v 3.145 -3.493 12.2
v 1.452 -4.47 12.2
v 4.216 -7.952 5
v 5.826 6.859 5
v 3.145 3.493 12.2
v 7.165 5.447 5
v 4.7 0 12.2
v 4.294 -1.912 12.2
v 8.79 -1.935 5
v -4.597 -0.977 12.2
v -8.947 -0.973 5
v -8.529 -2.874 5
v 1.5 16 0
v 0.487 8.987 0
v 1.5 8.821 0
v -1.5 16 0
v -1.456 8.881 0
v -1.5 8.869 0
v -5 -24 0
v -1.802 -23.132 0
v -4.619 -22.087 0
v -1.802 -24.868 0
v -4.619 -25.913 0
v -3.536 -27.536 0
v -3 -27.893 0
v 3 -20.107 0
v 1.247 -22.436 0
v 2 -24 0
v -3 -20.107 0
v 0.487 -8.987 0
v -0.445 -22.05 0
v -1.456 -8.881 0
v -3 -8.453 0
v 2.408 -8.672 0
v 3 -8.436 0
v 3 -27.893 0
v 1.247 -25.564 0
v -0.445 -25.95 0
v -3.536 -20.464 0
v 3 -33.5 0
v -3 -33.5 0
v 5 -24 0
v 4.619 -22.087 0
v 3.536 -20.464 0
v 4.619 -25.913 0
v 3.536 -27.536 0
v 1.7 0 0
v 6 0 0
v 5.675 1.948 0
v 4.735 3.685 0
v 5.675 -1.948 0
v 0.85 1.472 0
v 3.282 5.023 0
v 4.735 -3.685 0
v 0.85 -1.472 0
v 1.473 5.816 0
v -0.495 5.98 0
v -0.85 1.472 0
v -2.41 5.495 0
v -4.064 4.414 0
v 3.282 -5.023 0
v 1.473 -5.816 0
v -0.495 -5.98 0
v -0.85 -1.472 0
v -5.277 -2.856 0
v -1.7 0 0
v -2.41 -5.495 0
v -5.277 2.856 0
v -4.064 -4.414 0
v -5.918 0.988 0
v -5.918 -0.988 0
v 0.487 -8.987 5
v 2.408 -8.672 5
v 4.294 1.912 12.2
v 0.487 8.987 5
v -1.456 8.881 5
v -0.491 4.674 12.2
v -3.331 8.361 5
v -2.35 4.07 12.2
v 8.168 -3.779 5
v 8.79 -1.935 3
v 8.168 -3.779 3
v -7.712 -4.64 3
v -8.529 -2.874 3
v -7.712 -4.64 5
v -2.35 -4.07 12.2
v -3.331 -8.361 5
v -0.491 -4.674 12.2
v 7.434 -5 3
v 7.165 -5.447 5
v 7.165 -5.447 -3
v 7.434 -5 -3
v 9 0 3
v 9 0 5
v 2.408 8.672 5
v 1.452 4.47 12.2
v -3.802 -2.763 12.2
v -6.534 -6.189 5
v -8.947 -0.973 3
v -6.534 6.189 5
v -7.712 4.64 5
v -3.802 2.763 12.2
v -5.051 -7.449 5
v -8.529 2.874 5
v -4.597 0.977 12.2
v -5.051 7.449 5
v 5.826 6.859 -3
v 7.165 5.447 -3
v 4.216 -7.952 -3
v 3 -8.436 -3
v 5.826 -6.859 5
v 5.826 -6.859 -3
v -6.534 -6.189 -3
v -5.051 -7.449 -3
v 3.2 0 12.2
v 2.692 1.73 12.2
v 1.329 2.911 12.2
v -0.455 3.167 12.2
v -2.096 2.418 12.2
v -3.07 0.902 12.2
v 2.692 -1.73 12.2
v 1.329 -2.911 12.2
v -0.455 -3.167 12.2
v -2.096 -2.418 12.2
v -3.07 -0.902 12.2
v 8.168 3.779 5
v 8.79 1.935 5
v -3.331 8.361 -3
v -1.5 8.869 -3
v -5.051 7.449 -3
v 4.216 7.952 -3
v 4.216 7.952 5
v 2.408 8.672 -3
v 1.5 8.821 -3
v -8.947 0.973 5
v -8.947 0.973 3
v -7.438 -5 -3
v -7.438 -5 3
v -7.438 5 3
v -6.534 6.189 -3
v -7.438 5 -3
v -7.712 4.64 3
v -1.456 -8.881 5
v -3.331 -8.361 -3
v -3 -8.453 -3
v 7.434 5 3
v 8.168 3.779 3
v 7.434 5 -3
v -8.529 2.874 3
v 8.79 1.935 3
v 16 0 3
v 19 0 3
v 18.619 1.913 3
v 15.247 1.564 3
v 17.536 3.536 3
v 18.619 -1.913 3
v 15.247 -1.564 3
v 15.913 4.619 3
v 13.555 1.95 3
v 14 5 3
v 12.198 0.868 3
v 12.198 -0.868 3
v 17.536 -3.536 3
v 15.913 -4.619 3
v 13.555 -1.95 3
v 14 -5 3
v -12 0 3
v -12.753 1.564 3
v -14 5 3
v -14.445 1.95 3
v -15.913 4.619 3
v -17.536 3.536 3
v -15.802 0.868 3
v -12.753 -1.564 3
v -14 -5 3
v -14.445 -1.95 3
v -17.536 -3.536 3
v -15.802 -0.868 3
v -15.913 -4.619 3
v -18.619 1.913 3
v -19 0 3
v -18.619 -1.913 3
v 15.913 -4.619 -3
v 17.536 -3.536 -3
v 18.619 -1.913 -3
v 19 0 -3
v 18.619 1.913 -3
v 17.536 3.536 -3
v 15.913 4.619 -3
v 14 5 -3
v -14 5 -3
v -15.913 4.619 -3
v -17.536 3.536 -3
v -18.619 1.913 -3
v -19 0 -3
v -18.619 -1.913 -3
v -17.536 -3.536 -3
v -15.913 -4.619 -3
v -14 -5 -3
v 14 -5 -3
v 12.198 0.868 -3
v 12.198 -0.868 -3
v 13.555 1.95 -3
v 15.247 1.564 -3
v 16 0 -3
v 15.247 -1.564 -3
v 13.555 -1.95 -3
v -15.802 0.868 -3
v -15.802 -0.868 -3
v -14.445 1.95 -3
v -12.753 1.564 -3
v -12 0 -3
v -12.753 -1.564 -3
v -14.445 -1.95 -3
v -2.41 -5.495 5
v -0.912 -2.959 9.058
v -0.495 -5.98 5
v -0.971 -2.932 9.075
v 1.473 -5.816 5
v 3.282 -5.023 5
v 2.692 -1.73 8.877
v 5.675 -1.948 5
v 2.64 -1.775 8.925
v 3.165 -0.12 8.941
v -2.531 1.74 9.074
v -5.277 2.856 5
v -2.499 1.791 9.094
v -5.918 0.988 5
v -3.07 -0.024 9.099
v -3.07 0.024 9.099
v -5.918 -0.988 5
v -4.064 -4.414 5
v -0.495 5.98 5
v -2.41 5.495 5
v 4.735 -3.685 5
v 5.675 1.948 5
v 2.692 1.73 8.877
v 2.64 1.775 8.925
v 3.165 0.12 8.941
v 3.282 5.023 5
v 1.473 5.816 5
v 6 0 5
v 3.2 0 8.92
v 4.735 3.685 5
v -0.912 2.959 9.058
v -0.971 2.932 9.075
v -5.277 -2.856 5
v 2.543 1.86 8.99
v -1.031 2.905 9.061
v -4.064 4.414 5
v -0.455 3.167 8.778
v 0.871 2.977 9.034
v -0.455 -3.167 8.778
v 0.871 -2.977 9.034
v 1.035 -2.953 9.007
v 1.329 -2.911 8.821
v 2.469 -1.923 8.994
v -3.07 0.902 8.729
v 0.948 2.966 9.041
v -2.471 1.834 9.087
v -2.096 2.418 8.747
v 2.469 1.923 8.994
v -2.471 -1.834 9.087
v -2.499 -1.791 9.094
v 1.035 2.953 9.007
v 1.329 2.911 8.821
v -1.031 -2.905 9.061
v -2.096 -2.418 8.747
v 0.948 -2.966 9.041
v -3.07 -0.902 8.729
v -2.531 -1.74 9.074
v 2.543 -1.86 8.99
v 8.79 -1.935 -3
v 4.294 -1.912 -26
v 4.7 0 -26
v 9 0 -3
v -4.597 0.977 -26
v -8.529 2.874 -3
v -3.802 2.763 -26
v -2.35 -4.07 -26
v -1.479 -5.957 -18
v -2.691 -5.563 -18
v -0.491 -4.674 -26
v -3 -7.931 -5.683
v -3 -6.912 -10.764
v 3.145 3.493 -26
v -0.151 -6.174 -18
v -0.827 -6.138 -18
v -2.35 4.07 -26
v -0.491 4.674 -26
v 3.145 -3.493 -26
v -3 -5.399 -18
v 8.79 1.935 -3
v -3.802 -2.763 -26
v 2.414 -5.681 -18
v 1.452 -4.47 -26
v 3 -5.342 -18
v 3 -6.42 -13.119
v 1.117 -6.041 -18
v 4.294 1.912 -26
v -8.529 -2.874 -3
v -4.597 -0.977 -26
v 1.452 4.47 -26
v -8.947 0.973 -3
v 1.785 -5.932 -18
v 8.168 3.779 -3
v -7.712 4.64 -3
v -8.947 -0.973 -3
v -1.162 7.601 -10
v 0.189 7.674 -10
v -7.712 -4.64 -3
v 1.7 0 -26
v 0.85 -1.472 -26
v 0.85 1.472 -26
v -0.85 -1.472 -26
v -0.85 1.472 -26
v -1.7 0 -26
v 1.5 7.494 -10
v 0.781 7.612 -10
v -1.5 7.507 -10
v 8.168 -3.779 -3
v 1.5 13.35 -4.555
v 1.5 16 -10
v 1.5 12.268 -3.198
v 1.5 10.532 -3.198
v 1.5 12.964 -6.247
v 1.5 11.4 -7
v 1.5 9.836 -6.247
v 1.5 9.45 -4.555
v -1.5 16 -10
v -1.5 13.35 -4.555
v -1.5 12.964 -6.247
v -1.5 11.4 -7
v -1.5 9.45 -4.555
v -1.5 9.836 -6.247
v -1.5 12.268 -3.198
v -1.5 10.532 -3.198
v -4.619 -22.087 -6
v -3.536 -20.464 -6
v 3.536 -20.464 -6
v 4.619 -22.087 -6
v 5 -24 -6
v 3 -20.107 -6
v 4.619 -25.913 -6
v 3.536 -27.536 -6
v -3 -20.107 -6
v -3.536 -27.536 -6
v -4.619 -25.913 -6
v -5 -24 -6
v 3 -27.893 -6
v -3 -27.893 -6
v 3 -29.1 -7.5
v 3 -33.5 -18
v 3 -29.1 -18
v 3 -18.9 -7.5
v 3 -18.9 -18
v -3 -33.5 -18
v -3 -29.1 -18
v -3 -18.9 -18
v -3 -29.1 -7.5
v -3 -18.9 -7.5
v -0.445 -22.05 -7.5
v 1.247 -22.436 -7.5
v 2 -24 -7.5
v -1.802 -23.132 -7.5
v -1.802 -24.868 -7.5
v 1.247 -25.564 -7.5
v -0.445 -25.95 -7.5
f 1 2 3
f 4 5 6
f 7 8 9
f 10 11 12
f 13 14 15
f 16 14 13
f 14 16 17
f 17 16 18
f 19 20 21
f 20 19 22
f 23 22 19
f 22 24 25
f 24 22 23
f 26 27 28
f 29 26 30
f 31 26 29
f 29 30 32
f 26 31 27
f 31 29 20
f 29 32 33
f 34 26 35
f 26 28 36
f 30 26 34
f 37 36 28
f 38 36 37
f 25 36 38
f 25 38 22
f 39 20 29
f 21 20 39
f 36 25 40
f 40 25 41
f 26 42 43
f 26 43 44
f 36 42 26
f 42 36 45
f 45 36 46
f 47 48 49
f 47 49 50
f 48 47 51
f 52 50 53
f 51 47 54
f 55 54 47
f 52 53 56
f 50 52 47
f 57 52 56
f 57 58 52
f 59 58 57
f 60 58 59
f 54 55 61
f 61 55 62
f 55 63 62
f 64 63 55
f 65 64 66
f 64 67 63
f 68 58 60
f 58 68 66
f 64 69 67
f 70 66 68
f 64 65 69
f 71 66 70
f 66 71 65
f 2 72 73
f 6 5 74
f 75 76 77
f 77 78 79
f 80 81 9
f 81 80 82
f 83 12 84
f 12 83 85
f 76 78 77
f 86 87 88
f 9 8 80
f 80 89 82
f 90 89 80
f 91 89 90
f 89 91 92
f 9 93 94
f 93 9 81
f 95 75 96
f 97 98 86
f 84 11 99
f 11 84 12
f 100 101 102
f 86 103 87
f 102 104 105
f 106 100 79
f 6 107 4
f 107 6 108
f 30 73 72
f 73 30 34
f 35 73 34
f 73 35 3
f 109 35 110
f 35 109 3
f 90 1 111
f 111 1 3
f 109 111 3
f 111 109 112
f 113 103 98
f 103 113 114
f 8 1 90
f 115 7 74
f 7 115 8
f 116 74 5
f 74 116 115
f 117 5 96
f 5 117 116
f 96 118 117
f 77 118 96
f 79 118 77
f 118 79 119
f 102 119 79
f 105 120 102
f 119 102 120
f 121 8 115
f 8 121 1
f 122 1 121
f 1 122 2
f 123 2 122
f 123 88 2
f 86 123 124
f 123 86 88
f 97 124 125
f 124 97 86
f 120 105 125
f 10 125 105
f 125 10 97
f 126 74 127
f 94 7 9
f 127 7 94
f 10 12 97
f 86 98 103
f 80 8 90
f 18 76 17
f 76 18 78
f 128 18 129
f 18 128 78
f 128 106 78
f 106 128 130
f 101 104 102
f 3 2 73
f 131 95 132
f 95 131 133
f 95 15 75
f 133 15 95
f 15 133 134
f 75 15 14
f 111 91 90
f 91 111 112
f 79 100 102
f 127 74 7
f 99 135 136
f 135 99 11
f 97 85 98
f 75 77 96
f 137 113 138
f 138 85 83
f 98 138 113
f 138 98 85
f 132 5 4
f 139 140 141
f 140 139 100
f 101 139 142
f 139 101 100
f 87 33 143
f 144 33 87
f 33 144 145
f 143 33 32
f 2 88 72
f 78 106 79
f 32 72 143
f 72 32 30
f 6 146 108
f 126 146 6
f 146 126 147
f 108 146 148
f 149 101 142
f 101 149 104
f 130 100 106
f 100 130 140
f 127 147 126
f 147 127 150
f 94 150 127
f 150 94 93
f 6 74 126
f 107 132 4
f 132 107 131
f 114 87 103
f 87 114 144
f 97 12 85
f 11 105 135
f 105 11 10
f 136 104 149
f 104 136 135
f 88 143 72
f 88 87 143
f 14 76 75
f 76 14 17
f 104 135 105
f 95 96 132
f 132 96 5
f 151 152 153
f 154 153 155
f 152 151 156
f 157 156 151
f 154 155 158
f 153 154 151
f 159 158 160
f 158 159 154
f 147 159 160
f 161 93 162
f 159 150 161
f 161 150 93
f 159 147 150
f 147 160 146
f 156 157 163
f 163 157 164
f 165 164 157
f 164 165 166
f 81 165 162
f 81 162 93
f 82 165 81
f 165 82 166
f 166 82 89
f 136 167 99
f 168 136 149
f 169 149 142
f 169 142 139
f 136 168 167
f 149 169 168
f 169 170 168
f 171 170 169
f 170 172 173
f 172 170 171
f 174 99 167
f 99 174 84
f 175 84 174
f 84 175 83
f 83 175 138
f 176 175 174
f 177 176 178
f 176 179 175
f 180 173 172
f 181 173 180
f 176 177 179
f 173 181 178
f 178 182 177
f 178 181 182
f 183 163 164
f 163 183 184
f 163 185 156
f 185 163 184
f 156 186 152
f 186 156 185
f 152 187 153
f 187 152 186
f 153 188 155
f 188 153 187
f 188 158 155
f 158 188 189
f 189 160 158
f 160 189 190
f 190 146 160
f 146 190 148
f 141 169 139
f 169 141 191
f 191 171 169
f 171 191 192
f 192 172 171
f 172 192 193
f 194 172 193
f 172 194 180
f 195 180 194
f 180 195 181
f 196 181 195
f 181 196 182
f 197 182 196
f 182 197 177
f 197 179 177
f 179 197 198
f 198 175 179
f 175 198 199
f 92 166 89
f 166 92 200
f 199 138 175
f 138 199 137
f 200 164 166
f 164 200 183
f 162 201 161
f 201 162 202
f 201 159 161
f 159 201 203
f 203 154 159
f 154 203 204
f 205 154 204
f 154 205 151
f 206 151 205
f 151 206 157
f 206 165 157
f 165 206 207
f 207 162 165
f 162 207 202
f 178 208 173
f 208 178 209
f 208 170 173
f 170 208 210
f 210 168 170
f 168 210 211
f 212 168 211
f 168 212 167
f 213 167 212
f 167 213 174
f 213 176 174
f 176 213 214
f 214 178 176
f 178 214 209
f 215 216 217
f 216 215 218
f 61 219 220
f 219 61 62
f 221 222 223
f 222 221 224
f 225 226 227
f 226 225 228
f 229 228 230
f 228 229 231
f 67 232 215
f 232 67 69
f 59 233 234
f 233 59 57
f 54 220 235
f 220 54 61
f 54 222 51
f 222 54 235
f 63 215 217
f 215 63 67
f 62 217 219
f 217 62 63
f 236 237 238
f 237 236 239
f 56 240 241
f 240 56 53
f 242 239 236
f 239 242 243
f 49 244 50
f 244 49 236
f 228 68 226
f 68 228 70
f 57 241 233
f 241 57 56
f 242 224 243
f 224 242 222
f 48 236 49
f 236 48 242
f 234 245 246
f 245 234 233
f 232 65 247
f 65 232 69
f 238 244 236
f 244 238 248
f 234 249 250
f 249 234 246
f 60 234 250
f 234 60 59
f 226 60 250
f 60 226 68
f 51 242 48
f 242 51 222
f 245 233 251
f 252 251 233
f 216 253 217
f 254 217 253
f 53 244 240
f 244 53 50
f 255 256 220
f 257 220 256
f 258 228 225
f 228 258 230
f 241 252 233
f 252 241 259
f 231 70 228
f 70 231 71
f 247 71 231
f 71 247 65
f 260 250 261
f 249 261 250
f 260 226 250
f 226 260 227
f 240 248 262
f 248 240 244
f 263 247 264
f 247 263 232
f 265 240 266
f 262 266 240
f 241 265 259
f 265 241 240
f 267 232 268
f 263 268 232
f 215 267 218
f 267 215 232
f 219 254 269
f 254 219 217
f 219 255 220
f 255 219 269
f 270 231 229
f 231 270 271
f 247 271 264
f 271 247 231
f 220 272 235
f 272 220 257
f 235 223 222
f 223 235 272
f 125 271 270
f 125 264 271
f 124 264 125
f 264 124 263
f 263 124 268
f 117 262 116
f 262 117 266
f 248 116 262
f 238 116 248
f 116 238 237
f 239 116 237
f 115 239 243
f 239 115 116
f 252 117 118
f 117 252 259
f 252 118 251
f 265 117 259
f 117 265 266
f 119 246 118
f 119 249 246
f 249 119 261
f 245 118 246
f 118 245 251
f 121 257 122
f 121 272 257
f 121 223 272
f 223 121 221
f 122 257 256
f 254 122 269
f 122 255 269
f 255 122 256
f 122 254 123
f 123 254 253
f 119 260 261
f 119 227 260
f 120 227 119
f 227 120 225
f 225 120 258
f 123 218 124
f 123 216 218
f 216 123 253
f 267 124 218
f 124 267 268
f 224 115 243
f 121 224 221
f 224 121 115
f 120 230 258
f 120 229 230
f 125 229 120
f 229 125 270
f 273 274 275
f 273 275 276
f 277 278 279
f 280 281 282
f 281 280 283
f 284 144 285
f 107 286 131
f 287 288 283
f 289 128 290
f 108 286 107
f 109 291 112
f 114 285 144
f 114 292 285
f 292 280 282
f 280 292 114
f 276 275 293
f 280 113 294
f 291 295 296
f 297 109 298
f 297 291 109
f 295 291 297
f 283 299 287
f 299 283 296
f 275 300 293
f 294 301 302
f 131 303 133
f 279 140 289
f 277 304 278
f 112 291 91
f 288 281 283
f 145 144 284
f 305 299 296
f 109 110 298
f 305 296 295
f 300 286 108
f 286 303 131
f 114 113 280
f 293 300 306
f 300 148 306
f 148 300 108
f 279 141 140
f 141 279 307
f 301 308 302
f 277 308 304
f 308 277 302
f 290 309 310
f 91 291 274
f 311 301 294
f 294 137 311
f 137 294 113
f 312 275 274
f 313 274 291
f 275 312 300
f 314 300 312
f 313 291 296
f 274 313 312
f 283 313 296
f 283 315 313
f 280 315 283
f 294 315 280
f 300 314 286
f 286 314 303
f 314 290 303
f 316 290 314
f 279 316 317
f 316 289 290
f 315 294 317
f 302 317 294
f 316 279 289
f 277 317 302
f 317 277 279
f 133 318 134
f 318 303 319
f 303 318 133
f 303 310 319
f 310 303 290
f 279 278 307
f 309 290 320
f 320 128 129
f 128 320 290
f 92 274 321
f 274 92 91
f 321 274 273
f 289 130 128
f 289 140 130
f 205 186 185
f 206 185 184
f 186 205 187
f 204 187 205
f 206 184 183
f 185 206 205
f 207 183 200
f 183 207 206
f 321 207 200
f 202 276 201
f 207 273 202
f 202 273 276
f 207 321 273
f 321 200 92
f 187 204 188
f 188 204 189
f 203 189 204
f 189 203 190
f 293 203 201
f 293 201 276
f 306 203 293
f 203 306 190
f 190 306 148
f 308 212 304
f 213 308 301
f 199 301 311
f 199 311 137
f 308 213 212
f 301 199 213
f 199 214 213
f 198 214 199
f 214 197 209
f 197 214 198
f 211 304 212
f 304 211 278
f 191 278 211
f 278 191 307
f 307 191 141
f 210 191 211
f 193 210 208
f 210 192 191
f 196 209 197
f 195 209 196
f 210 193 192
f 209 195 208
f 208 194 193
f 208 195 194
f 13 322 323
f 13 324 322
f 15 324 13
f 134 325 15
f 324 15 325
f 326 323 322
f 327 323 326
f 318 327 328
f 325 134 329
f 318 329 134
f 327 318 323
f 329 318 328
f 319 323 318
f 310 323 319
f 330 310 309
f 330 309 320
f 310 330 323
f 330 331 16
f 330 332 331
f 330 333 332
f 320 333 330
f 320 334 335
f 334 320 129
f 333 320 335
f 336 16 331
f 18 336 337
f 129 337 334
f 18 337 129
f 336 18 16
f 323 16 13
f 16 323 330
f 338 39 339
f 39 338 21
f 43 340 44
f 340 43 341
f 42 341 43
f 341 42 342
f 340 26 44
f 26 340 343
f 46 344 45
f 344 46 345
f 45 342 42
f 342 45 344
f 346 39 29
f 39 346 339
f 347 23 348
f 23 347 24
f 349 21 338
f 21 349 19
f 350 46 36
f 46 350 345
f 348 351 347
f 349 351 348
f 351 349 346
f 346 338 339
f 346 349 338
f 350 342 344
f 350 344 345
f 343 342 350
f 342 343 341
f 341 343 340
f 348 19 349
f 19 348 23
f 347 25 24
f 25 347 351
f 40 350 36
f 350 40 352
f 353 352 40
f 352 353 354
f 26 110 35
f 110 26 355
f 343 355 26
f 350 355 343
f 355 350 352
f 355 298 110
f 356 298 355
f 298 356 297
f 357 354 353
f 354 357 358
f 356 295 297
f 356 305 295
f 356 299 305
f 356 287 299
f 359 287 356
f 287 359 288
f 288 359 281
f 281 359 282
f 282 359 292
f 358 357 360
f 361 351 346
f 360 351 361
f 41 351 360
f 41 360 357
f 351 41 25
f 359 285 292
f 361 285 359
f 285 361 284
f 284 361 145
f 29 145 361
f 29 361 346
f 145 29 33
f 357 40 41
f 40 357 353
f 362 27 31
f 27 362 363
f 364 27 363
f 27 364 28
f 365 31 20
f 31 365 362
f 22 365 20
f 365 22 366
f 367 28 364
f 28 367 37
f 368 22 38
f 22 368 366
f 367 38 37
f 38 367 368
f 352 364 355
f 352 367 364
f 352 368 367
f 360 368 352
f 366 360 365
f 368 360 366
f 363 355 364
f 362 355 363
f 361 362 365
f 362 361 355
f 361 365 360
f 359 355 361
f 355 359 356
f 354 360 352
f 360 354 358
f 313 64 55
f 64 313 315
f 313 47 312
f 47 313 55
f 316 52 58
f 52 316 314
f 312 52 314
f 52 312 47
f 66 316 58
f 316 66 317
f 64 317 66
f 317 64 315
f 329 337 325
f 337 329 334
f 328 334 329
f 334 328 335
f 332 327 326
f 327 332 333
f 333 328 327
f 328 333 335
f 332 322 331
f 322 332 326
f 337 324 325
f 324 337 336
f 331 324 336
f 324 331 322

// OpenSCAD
// file: params.scad
t=3;
r=8;
h=60;
w=6*r;
bt=t;

echo(w+2*r,h);

sr=2;

sbh=t/2;
sbr=2*sr;

s=0.1;
twist_a=720;

zh=5*t;

mrr=1.7; //'magnetic rod' radius.
mrh = 26;

bcr=6; bcz=1.5*t;bch=5; //'Cap' radius, height.
d=4*bcr; //Distance

s=0.1;
// main file
//
//  Copyright (C) 14-01-2014 Jasper den Ouden.
//
//  This is free software: you can redistribute it and/or modify
//  it under the terms of the GNU General Public License as published
//  by the Free Software Foundation, either version 3 of the License, or
//  (at your option) any later version.
//

include<params.scad>

module screwthing()
{   linear_extrude(height=t) difference()
    {   hull() for(x=(bcr+2*t+sr)*[1,-1]) translate([x,0]) circle(sr+t);
        for(x=(bcr+2*t+sr)*[1,-1]) translate([x,0]) circle(sr);
    }
}
module edm_bottom() //Bottom where thing slides.
{   q=d+sr+2.5*t;
    rotate([180,0,0]) difference()
    {   union()
        {   hull()
            {   cylinder(r=mrr+t,h=mrh);
                translate([0,0,mrh-t]) cylinder(r=bcr+t,h=t);
            }
            translate([0,0,mrh-t]) screwthing();
            translate([0,bcr+sr,mrh-sr-t]) cube([t,2*(bcr+sr),2*(t+sr)],center=true);
            //Block to connect to other bit with.
            translate([0,-d,mrh-2*t]) cylinder(r=sr+t,h=2*t);
            translate([-t,-q,mrh-zh-t])  cube([2*t,q,zh+t]);
        }
        translate([0,-d,-t]) cylinder(r=sr,h=8*mrh);
        translate([0,-d,mrh-zh]) cube([8*t,2*(sr+t+s),2*zh-5*t],center=true);
        translate([0,0,-mrh]) cylinder(r=mrr,h=8*mrh); //Hole for the slider itself.

        translate([-4*t,bcr+t+1.2*sr,mrh-sr-t]) rotate([0,90,0]) cylinder(r=sr,h=8*t);
    }
}

module edm_top() //Cap with coil in it.
{   hole_r=max(mrr+t/2,bcr-2*t);
    difference()
    {   union()
        {   hull()
            {   cylinder(r=bcr+t,h=bch);
                cylinder(r=hole_r+t/2,h=bch+1.2*bcr);
            }
            screwthing();
        }
        hull()
        {   translate([0,0,-bch]) cylinder(r=bcr,h=2*bch);
            cylinder(r=t,h=bch+1.2*bcr-t);
        }
        cylinder(r=hole_r,h=8*bch);
    }
}

module show_edm()
{   edm_top();
    translate([0,0,-mrh]) color("blue") rotate([180,0,0]) edm_bottom();
}
show_edm();
